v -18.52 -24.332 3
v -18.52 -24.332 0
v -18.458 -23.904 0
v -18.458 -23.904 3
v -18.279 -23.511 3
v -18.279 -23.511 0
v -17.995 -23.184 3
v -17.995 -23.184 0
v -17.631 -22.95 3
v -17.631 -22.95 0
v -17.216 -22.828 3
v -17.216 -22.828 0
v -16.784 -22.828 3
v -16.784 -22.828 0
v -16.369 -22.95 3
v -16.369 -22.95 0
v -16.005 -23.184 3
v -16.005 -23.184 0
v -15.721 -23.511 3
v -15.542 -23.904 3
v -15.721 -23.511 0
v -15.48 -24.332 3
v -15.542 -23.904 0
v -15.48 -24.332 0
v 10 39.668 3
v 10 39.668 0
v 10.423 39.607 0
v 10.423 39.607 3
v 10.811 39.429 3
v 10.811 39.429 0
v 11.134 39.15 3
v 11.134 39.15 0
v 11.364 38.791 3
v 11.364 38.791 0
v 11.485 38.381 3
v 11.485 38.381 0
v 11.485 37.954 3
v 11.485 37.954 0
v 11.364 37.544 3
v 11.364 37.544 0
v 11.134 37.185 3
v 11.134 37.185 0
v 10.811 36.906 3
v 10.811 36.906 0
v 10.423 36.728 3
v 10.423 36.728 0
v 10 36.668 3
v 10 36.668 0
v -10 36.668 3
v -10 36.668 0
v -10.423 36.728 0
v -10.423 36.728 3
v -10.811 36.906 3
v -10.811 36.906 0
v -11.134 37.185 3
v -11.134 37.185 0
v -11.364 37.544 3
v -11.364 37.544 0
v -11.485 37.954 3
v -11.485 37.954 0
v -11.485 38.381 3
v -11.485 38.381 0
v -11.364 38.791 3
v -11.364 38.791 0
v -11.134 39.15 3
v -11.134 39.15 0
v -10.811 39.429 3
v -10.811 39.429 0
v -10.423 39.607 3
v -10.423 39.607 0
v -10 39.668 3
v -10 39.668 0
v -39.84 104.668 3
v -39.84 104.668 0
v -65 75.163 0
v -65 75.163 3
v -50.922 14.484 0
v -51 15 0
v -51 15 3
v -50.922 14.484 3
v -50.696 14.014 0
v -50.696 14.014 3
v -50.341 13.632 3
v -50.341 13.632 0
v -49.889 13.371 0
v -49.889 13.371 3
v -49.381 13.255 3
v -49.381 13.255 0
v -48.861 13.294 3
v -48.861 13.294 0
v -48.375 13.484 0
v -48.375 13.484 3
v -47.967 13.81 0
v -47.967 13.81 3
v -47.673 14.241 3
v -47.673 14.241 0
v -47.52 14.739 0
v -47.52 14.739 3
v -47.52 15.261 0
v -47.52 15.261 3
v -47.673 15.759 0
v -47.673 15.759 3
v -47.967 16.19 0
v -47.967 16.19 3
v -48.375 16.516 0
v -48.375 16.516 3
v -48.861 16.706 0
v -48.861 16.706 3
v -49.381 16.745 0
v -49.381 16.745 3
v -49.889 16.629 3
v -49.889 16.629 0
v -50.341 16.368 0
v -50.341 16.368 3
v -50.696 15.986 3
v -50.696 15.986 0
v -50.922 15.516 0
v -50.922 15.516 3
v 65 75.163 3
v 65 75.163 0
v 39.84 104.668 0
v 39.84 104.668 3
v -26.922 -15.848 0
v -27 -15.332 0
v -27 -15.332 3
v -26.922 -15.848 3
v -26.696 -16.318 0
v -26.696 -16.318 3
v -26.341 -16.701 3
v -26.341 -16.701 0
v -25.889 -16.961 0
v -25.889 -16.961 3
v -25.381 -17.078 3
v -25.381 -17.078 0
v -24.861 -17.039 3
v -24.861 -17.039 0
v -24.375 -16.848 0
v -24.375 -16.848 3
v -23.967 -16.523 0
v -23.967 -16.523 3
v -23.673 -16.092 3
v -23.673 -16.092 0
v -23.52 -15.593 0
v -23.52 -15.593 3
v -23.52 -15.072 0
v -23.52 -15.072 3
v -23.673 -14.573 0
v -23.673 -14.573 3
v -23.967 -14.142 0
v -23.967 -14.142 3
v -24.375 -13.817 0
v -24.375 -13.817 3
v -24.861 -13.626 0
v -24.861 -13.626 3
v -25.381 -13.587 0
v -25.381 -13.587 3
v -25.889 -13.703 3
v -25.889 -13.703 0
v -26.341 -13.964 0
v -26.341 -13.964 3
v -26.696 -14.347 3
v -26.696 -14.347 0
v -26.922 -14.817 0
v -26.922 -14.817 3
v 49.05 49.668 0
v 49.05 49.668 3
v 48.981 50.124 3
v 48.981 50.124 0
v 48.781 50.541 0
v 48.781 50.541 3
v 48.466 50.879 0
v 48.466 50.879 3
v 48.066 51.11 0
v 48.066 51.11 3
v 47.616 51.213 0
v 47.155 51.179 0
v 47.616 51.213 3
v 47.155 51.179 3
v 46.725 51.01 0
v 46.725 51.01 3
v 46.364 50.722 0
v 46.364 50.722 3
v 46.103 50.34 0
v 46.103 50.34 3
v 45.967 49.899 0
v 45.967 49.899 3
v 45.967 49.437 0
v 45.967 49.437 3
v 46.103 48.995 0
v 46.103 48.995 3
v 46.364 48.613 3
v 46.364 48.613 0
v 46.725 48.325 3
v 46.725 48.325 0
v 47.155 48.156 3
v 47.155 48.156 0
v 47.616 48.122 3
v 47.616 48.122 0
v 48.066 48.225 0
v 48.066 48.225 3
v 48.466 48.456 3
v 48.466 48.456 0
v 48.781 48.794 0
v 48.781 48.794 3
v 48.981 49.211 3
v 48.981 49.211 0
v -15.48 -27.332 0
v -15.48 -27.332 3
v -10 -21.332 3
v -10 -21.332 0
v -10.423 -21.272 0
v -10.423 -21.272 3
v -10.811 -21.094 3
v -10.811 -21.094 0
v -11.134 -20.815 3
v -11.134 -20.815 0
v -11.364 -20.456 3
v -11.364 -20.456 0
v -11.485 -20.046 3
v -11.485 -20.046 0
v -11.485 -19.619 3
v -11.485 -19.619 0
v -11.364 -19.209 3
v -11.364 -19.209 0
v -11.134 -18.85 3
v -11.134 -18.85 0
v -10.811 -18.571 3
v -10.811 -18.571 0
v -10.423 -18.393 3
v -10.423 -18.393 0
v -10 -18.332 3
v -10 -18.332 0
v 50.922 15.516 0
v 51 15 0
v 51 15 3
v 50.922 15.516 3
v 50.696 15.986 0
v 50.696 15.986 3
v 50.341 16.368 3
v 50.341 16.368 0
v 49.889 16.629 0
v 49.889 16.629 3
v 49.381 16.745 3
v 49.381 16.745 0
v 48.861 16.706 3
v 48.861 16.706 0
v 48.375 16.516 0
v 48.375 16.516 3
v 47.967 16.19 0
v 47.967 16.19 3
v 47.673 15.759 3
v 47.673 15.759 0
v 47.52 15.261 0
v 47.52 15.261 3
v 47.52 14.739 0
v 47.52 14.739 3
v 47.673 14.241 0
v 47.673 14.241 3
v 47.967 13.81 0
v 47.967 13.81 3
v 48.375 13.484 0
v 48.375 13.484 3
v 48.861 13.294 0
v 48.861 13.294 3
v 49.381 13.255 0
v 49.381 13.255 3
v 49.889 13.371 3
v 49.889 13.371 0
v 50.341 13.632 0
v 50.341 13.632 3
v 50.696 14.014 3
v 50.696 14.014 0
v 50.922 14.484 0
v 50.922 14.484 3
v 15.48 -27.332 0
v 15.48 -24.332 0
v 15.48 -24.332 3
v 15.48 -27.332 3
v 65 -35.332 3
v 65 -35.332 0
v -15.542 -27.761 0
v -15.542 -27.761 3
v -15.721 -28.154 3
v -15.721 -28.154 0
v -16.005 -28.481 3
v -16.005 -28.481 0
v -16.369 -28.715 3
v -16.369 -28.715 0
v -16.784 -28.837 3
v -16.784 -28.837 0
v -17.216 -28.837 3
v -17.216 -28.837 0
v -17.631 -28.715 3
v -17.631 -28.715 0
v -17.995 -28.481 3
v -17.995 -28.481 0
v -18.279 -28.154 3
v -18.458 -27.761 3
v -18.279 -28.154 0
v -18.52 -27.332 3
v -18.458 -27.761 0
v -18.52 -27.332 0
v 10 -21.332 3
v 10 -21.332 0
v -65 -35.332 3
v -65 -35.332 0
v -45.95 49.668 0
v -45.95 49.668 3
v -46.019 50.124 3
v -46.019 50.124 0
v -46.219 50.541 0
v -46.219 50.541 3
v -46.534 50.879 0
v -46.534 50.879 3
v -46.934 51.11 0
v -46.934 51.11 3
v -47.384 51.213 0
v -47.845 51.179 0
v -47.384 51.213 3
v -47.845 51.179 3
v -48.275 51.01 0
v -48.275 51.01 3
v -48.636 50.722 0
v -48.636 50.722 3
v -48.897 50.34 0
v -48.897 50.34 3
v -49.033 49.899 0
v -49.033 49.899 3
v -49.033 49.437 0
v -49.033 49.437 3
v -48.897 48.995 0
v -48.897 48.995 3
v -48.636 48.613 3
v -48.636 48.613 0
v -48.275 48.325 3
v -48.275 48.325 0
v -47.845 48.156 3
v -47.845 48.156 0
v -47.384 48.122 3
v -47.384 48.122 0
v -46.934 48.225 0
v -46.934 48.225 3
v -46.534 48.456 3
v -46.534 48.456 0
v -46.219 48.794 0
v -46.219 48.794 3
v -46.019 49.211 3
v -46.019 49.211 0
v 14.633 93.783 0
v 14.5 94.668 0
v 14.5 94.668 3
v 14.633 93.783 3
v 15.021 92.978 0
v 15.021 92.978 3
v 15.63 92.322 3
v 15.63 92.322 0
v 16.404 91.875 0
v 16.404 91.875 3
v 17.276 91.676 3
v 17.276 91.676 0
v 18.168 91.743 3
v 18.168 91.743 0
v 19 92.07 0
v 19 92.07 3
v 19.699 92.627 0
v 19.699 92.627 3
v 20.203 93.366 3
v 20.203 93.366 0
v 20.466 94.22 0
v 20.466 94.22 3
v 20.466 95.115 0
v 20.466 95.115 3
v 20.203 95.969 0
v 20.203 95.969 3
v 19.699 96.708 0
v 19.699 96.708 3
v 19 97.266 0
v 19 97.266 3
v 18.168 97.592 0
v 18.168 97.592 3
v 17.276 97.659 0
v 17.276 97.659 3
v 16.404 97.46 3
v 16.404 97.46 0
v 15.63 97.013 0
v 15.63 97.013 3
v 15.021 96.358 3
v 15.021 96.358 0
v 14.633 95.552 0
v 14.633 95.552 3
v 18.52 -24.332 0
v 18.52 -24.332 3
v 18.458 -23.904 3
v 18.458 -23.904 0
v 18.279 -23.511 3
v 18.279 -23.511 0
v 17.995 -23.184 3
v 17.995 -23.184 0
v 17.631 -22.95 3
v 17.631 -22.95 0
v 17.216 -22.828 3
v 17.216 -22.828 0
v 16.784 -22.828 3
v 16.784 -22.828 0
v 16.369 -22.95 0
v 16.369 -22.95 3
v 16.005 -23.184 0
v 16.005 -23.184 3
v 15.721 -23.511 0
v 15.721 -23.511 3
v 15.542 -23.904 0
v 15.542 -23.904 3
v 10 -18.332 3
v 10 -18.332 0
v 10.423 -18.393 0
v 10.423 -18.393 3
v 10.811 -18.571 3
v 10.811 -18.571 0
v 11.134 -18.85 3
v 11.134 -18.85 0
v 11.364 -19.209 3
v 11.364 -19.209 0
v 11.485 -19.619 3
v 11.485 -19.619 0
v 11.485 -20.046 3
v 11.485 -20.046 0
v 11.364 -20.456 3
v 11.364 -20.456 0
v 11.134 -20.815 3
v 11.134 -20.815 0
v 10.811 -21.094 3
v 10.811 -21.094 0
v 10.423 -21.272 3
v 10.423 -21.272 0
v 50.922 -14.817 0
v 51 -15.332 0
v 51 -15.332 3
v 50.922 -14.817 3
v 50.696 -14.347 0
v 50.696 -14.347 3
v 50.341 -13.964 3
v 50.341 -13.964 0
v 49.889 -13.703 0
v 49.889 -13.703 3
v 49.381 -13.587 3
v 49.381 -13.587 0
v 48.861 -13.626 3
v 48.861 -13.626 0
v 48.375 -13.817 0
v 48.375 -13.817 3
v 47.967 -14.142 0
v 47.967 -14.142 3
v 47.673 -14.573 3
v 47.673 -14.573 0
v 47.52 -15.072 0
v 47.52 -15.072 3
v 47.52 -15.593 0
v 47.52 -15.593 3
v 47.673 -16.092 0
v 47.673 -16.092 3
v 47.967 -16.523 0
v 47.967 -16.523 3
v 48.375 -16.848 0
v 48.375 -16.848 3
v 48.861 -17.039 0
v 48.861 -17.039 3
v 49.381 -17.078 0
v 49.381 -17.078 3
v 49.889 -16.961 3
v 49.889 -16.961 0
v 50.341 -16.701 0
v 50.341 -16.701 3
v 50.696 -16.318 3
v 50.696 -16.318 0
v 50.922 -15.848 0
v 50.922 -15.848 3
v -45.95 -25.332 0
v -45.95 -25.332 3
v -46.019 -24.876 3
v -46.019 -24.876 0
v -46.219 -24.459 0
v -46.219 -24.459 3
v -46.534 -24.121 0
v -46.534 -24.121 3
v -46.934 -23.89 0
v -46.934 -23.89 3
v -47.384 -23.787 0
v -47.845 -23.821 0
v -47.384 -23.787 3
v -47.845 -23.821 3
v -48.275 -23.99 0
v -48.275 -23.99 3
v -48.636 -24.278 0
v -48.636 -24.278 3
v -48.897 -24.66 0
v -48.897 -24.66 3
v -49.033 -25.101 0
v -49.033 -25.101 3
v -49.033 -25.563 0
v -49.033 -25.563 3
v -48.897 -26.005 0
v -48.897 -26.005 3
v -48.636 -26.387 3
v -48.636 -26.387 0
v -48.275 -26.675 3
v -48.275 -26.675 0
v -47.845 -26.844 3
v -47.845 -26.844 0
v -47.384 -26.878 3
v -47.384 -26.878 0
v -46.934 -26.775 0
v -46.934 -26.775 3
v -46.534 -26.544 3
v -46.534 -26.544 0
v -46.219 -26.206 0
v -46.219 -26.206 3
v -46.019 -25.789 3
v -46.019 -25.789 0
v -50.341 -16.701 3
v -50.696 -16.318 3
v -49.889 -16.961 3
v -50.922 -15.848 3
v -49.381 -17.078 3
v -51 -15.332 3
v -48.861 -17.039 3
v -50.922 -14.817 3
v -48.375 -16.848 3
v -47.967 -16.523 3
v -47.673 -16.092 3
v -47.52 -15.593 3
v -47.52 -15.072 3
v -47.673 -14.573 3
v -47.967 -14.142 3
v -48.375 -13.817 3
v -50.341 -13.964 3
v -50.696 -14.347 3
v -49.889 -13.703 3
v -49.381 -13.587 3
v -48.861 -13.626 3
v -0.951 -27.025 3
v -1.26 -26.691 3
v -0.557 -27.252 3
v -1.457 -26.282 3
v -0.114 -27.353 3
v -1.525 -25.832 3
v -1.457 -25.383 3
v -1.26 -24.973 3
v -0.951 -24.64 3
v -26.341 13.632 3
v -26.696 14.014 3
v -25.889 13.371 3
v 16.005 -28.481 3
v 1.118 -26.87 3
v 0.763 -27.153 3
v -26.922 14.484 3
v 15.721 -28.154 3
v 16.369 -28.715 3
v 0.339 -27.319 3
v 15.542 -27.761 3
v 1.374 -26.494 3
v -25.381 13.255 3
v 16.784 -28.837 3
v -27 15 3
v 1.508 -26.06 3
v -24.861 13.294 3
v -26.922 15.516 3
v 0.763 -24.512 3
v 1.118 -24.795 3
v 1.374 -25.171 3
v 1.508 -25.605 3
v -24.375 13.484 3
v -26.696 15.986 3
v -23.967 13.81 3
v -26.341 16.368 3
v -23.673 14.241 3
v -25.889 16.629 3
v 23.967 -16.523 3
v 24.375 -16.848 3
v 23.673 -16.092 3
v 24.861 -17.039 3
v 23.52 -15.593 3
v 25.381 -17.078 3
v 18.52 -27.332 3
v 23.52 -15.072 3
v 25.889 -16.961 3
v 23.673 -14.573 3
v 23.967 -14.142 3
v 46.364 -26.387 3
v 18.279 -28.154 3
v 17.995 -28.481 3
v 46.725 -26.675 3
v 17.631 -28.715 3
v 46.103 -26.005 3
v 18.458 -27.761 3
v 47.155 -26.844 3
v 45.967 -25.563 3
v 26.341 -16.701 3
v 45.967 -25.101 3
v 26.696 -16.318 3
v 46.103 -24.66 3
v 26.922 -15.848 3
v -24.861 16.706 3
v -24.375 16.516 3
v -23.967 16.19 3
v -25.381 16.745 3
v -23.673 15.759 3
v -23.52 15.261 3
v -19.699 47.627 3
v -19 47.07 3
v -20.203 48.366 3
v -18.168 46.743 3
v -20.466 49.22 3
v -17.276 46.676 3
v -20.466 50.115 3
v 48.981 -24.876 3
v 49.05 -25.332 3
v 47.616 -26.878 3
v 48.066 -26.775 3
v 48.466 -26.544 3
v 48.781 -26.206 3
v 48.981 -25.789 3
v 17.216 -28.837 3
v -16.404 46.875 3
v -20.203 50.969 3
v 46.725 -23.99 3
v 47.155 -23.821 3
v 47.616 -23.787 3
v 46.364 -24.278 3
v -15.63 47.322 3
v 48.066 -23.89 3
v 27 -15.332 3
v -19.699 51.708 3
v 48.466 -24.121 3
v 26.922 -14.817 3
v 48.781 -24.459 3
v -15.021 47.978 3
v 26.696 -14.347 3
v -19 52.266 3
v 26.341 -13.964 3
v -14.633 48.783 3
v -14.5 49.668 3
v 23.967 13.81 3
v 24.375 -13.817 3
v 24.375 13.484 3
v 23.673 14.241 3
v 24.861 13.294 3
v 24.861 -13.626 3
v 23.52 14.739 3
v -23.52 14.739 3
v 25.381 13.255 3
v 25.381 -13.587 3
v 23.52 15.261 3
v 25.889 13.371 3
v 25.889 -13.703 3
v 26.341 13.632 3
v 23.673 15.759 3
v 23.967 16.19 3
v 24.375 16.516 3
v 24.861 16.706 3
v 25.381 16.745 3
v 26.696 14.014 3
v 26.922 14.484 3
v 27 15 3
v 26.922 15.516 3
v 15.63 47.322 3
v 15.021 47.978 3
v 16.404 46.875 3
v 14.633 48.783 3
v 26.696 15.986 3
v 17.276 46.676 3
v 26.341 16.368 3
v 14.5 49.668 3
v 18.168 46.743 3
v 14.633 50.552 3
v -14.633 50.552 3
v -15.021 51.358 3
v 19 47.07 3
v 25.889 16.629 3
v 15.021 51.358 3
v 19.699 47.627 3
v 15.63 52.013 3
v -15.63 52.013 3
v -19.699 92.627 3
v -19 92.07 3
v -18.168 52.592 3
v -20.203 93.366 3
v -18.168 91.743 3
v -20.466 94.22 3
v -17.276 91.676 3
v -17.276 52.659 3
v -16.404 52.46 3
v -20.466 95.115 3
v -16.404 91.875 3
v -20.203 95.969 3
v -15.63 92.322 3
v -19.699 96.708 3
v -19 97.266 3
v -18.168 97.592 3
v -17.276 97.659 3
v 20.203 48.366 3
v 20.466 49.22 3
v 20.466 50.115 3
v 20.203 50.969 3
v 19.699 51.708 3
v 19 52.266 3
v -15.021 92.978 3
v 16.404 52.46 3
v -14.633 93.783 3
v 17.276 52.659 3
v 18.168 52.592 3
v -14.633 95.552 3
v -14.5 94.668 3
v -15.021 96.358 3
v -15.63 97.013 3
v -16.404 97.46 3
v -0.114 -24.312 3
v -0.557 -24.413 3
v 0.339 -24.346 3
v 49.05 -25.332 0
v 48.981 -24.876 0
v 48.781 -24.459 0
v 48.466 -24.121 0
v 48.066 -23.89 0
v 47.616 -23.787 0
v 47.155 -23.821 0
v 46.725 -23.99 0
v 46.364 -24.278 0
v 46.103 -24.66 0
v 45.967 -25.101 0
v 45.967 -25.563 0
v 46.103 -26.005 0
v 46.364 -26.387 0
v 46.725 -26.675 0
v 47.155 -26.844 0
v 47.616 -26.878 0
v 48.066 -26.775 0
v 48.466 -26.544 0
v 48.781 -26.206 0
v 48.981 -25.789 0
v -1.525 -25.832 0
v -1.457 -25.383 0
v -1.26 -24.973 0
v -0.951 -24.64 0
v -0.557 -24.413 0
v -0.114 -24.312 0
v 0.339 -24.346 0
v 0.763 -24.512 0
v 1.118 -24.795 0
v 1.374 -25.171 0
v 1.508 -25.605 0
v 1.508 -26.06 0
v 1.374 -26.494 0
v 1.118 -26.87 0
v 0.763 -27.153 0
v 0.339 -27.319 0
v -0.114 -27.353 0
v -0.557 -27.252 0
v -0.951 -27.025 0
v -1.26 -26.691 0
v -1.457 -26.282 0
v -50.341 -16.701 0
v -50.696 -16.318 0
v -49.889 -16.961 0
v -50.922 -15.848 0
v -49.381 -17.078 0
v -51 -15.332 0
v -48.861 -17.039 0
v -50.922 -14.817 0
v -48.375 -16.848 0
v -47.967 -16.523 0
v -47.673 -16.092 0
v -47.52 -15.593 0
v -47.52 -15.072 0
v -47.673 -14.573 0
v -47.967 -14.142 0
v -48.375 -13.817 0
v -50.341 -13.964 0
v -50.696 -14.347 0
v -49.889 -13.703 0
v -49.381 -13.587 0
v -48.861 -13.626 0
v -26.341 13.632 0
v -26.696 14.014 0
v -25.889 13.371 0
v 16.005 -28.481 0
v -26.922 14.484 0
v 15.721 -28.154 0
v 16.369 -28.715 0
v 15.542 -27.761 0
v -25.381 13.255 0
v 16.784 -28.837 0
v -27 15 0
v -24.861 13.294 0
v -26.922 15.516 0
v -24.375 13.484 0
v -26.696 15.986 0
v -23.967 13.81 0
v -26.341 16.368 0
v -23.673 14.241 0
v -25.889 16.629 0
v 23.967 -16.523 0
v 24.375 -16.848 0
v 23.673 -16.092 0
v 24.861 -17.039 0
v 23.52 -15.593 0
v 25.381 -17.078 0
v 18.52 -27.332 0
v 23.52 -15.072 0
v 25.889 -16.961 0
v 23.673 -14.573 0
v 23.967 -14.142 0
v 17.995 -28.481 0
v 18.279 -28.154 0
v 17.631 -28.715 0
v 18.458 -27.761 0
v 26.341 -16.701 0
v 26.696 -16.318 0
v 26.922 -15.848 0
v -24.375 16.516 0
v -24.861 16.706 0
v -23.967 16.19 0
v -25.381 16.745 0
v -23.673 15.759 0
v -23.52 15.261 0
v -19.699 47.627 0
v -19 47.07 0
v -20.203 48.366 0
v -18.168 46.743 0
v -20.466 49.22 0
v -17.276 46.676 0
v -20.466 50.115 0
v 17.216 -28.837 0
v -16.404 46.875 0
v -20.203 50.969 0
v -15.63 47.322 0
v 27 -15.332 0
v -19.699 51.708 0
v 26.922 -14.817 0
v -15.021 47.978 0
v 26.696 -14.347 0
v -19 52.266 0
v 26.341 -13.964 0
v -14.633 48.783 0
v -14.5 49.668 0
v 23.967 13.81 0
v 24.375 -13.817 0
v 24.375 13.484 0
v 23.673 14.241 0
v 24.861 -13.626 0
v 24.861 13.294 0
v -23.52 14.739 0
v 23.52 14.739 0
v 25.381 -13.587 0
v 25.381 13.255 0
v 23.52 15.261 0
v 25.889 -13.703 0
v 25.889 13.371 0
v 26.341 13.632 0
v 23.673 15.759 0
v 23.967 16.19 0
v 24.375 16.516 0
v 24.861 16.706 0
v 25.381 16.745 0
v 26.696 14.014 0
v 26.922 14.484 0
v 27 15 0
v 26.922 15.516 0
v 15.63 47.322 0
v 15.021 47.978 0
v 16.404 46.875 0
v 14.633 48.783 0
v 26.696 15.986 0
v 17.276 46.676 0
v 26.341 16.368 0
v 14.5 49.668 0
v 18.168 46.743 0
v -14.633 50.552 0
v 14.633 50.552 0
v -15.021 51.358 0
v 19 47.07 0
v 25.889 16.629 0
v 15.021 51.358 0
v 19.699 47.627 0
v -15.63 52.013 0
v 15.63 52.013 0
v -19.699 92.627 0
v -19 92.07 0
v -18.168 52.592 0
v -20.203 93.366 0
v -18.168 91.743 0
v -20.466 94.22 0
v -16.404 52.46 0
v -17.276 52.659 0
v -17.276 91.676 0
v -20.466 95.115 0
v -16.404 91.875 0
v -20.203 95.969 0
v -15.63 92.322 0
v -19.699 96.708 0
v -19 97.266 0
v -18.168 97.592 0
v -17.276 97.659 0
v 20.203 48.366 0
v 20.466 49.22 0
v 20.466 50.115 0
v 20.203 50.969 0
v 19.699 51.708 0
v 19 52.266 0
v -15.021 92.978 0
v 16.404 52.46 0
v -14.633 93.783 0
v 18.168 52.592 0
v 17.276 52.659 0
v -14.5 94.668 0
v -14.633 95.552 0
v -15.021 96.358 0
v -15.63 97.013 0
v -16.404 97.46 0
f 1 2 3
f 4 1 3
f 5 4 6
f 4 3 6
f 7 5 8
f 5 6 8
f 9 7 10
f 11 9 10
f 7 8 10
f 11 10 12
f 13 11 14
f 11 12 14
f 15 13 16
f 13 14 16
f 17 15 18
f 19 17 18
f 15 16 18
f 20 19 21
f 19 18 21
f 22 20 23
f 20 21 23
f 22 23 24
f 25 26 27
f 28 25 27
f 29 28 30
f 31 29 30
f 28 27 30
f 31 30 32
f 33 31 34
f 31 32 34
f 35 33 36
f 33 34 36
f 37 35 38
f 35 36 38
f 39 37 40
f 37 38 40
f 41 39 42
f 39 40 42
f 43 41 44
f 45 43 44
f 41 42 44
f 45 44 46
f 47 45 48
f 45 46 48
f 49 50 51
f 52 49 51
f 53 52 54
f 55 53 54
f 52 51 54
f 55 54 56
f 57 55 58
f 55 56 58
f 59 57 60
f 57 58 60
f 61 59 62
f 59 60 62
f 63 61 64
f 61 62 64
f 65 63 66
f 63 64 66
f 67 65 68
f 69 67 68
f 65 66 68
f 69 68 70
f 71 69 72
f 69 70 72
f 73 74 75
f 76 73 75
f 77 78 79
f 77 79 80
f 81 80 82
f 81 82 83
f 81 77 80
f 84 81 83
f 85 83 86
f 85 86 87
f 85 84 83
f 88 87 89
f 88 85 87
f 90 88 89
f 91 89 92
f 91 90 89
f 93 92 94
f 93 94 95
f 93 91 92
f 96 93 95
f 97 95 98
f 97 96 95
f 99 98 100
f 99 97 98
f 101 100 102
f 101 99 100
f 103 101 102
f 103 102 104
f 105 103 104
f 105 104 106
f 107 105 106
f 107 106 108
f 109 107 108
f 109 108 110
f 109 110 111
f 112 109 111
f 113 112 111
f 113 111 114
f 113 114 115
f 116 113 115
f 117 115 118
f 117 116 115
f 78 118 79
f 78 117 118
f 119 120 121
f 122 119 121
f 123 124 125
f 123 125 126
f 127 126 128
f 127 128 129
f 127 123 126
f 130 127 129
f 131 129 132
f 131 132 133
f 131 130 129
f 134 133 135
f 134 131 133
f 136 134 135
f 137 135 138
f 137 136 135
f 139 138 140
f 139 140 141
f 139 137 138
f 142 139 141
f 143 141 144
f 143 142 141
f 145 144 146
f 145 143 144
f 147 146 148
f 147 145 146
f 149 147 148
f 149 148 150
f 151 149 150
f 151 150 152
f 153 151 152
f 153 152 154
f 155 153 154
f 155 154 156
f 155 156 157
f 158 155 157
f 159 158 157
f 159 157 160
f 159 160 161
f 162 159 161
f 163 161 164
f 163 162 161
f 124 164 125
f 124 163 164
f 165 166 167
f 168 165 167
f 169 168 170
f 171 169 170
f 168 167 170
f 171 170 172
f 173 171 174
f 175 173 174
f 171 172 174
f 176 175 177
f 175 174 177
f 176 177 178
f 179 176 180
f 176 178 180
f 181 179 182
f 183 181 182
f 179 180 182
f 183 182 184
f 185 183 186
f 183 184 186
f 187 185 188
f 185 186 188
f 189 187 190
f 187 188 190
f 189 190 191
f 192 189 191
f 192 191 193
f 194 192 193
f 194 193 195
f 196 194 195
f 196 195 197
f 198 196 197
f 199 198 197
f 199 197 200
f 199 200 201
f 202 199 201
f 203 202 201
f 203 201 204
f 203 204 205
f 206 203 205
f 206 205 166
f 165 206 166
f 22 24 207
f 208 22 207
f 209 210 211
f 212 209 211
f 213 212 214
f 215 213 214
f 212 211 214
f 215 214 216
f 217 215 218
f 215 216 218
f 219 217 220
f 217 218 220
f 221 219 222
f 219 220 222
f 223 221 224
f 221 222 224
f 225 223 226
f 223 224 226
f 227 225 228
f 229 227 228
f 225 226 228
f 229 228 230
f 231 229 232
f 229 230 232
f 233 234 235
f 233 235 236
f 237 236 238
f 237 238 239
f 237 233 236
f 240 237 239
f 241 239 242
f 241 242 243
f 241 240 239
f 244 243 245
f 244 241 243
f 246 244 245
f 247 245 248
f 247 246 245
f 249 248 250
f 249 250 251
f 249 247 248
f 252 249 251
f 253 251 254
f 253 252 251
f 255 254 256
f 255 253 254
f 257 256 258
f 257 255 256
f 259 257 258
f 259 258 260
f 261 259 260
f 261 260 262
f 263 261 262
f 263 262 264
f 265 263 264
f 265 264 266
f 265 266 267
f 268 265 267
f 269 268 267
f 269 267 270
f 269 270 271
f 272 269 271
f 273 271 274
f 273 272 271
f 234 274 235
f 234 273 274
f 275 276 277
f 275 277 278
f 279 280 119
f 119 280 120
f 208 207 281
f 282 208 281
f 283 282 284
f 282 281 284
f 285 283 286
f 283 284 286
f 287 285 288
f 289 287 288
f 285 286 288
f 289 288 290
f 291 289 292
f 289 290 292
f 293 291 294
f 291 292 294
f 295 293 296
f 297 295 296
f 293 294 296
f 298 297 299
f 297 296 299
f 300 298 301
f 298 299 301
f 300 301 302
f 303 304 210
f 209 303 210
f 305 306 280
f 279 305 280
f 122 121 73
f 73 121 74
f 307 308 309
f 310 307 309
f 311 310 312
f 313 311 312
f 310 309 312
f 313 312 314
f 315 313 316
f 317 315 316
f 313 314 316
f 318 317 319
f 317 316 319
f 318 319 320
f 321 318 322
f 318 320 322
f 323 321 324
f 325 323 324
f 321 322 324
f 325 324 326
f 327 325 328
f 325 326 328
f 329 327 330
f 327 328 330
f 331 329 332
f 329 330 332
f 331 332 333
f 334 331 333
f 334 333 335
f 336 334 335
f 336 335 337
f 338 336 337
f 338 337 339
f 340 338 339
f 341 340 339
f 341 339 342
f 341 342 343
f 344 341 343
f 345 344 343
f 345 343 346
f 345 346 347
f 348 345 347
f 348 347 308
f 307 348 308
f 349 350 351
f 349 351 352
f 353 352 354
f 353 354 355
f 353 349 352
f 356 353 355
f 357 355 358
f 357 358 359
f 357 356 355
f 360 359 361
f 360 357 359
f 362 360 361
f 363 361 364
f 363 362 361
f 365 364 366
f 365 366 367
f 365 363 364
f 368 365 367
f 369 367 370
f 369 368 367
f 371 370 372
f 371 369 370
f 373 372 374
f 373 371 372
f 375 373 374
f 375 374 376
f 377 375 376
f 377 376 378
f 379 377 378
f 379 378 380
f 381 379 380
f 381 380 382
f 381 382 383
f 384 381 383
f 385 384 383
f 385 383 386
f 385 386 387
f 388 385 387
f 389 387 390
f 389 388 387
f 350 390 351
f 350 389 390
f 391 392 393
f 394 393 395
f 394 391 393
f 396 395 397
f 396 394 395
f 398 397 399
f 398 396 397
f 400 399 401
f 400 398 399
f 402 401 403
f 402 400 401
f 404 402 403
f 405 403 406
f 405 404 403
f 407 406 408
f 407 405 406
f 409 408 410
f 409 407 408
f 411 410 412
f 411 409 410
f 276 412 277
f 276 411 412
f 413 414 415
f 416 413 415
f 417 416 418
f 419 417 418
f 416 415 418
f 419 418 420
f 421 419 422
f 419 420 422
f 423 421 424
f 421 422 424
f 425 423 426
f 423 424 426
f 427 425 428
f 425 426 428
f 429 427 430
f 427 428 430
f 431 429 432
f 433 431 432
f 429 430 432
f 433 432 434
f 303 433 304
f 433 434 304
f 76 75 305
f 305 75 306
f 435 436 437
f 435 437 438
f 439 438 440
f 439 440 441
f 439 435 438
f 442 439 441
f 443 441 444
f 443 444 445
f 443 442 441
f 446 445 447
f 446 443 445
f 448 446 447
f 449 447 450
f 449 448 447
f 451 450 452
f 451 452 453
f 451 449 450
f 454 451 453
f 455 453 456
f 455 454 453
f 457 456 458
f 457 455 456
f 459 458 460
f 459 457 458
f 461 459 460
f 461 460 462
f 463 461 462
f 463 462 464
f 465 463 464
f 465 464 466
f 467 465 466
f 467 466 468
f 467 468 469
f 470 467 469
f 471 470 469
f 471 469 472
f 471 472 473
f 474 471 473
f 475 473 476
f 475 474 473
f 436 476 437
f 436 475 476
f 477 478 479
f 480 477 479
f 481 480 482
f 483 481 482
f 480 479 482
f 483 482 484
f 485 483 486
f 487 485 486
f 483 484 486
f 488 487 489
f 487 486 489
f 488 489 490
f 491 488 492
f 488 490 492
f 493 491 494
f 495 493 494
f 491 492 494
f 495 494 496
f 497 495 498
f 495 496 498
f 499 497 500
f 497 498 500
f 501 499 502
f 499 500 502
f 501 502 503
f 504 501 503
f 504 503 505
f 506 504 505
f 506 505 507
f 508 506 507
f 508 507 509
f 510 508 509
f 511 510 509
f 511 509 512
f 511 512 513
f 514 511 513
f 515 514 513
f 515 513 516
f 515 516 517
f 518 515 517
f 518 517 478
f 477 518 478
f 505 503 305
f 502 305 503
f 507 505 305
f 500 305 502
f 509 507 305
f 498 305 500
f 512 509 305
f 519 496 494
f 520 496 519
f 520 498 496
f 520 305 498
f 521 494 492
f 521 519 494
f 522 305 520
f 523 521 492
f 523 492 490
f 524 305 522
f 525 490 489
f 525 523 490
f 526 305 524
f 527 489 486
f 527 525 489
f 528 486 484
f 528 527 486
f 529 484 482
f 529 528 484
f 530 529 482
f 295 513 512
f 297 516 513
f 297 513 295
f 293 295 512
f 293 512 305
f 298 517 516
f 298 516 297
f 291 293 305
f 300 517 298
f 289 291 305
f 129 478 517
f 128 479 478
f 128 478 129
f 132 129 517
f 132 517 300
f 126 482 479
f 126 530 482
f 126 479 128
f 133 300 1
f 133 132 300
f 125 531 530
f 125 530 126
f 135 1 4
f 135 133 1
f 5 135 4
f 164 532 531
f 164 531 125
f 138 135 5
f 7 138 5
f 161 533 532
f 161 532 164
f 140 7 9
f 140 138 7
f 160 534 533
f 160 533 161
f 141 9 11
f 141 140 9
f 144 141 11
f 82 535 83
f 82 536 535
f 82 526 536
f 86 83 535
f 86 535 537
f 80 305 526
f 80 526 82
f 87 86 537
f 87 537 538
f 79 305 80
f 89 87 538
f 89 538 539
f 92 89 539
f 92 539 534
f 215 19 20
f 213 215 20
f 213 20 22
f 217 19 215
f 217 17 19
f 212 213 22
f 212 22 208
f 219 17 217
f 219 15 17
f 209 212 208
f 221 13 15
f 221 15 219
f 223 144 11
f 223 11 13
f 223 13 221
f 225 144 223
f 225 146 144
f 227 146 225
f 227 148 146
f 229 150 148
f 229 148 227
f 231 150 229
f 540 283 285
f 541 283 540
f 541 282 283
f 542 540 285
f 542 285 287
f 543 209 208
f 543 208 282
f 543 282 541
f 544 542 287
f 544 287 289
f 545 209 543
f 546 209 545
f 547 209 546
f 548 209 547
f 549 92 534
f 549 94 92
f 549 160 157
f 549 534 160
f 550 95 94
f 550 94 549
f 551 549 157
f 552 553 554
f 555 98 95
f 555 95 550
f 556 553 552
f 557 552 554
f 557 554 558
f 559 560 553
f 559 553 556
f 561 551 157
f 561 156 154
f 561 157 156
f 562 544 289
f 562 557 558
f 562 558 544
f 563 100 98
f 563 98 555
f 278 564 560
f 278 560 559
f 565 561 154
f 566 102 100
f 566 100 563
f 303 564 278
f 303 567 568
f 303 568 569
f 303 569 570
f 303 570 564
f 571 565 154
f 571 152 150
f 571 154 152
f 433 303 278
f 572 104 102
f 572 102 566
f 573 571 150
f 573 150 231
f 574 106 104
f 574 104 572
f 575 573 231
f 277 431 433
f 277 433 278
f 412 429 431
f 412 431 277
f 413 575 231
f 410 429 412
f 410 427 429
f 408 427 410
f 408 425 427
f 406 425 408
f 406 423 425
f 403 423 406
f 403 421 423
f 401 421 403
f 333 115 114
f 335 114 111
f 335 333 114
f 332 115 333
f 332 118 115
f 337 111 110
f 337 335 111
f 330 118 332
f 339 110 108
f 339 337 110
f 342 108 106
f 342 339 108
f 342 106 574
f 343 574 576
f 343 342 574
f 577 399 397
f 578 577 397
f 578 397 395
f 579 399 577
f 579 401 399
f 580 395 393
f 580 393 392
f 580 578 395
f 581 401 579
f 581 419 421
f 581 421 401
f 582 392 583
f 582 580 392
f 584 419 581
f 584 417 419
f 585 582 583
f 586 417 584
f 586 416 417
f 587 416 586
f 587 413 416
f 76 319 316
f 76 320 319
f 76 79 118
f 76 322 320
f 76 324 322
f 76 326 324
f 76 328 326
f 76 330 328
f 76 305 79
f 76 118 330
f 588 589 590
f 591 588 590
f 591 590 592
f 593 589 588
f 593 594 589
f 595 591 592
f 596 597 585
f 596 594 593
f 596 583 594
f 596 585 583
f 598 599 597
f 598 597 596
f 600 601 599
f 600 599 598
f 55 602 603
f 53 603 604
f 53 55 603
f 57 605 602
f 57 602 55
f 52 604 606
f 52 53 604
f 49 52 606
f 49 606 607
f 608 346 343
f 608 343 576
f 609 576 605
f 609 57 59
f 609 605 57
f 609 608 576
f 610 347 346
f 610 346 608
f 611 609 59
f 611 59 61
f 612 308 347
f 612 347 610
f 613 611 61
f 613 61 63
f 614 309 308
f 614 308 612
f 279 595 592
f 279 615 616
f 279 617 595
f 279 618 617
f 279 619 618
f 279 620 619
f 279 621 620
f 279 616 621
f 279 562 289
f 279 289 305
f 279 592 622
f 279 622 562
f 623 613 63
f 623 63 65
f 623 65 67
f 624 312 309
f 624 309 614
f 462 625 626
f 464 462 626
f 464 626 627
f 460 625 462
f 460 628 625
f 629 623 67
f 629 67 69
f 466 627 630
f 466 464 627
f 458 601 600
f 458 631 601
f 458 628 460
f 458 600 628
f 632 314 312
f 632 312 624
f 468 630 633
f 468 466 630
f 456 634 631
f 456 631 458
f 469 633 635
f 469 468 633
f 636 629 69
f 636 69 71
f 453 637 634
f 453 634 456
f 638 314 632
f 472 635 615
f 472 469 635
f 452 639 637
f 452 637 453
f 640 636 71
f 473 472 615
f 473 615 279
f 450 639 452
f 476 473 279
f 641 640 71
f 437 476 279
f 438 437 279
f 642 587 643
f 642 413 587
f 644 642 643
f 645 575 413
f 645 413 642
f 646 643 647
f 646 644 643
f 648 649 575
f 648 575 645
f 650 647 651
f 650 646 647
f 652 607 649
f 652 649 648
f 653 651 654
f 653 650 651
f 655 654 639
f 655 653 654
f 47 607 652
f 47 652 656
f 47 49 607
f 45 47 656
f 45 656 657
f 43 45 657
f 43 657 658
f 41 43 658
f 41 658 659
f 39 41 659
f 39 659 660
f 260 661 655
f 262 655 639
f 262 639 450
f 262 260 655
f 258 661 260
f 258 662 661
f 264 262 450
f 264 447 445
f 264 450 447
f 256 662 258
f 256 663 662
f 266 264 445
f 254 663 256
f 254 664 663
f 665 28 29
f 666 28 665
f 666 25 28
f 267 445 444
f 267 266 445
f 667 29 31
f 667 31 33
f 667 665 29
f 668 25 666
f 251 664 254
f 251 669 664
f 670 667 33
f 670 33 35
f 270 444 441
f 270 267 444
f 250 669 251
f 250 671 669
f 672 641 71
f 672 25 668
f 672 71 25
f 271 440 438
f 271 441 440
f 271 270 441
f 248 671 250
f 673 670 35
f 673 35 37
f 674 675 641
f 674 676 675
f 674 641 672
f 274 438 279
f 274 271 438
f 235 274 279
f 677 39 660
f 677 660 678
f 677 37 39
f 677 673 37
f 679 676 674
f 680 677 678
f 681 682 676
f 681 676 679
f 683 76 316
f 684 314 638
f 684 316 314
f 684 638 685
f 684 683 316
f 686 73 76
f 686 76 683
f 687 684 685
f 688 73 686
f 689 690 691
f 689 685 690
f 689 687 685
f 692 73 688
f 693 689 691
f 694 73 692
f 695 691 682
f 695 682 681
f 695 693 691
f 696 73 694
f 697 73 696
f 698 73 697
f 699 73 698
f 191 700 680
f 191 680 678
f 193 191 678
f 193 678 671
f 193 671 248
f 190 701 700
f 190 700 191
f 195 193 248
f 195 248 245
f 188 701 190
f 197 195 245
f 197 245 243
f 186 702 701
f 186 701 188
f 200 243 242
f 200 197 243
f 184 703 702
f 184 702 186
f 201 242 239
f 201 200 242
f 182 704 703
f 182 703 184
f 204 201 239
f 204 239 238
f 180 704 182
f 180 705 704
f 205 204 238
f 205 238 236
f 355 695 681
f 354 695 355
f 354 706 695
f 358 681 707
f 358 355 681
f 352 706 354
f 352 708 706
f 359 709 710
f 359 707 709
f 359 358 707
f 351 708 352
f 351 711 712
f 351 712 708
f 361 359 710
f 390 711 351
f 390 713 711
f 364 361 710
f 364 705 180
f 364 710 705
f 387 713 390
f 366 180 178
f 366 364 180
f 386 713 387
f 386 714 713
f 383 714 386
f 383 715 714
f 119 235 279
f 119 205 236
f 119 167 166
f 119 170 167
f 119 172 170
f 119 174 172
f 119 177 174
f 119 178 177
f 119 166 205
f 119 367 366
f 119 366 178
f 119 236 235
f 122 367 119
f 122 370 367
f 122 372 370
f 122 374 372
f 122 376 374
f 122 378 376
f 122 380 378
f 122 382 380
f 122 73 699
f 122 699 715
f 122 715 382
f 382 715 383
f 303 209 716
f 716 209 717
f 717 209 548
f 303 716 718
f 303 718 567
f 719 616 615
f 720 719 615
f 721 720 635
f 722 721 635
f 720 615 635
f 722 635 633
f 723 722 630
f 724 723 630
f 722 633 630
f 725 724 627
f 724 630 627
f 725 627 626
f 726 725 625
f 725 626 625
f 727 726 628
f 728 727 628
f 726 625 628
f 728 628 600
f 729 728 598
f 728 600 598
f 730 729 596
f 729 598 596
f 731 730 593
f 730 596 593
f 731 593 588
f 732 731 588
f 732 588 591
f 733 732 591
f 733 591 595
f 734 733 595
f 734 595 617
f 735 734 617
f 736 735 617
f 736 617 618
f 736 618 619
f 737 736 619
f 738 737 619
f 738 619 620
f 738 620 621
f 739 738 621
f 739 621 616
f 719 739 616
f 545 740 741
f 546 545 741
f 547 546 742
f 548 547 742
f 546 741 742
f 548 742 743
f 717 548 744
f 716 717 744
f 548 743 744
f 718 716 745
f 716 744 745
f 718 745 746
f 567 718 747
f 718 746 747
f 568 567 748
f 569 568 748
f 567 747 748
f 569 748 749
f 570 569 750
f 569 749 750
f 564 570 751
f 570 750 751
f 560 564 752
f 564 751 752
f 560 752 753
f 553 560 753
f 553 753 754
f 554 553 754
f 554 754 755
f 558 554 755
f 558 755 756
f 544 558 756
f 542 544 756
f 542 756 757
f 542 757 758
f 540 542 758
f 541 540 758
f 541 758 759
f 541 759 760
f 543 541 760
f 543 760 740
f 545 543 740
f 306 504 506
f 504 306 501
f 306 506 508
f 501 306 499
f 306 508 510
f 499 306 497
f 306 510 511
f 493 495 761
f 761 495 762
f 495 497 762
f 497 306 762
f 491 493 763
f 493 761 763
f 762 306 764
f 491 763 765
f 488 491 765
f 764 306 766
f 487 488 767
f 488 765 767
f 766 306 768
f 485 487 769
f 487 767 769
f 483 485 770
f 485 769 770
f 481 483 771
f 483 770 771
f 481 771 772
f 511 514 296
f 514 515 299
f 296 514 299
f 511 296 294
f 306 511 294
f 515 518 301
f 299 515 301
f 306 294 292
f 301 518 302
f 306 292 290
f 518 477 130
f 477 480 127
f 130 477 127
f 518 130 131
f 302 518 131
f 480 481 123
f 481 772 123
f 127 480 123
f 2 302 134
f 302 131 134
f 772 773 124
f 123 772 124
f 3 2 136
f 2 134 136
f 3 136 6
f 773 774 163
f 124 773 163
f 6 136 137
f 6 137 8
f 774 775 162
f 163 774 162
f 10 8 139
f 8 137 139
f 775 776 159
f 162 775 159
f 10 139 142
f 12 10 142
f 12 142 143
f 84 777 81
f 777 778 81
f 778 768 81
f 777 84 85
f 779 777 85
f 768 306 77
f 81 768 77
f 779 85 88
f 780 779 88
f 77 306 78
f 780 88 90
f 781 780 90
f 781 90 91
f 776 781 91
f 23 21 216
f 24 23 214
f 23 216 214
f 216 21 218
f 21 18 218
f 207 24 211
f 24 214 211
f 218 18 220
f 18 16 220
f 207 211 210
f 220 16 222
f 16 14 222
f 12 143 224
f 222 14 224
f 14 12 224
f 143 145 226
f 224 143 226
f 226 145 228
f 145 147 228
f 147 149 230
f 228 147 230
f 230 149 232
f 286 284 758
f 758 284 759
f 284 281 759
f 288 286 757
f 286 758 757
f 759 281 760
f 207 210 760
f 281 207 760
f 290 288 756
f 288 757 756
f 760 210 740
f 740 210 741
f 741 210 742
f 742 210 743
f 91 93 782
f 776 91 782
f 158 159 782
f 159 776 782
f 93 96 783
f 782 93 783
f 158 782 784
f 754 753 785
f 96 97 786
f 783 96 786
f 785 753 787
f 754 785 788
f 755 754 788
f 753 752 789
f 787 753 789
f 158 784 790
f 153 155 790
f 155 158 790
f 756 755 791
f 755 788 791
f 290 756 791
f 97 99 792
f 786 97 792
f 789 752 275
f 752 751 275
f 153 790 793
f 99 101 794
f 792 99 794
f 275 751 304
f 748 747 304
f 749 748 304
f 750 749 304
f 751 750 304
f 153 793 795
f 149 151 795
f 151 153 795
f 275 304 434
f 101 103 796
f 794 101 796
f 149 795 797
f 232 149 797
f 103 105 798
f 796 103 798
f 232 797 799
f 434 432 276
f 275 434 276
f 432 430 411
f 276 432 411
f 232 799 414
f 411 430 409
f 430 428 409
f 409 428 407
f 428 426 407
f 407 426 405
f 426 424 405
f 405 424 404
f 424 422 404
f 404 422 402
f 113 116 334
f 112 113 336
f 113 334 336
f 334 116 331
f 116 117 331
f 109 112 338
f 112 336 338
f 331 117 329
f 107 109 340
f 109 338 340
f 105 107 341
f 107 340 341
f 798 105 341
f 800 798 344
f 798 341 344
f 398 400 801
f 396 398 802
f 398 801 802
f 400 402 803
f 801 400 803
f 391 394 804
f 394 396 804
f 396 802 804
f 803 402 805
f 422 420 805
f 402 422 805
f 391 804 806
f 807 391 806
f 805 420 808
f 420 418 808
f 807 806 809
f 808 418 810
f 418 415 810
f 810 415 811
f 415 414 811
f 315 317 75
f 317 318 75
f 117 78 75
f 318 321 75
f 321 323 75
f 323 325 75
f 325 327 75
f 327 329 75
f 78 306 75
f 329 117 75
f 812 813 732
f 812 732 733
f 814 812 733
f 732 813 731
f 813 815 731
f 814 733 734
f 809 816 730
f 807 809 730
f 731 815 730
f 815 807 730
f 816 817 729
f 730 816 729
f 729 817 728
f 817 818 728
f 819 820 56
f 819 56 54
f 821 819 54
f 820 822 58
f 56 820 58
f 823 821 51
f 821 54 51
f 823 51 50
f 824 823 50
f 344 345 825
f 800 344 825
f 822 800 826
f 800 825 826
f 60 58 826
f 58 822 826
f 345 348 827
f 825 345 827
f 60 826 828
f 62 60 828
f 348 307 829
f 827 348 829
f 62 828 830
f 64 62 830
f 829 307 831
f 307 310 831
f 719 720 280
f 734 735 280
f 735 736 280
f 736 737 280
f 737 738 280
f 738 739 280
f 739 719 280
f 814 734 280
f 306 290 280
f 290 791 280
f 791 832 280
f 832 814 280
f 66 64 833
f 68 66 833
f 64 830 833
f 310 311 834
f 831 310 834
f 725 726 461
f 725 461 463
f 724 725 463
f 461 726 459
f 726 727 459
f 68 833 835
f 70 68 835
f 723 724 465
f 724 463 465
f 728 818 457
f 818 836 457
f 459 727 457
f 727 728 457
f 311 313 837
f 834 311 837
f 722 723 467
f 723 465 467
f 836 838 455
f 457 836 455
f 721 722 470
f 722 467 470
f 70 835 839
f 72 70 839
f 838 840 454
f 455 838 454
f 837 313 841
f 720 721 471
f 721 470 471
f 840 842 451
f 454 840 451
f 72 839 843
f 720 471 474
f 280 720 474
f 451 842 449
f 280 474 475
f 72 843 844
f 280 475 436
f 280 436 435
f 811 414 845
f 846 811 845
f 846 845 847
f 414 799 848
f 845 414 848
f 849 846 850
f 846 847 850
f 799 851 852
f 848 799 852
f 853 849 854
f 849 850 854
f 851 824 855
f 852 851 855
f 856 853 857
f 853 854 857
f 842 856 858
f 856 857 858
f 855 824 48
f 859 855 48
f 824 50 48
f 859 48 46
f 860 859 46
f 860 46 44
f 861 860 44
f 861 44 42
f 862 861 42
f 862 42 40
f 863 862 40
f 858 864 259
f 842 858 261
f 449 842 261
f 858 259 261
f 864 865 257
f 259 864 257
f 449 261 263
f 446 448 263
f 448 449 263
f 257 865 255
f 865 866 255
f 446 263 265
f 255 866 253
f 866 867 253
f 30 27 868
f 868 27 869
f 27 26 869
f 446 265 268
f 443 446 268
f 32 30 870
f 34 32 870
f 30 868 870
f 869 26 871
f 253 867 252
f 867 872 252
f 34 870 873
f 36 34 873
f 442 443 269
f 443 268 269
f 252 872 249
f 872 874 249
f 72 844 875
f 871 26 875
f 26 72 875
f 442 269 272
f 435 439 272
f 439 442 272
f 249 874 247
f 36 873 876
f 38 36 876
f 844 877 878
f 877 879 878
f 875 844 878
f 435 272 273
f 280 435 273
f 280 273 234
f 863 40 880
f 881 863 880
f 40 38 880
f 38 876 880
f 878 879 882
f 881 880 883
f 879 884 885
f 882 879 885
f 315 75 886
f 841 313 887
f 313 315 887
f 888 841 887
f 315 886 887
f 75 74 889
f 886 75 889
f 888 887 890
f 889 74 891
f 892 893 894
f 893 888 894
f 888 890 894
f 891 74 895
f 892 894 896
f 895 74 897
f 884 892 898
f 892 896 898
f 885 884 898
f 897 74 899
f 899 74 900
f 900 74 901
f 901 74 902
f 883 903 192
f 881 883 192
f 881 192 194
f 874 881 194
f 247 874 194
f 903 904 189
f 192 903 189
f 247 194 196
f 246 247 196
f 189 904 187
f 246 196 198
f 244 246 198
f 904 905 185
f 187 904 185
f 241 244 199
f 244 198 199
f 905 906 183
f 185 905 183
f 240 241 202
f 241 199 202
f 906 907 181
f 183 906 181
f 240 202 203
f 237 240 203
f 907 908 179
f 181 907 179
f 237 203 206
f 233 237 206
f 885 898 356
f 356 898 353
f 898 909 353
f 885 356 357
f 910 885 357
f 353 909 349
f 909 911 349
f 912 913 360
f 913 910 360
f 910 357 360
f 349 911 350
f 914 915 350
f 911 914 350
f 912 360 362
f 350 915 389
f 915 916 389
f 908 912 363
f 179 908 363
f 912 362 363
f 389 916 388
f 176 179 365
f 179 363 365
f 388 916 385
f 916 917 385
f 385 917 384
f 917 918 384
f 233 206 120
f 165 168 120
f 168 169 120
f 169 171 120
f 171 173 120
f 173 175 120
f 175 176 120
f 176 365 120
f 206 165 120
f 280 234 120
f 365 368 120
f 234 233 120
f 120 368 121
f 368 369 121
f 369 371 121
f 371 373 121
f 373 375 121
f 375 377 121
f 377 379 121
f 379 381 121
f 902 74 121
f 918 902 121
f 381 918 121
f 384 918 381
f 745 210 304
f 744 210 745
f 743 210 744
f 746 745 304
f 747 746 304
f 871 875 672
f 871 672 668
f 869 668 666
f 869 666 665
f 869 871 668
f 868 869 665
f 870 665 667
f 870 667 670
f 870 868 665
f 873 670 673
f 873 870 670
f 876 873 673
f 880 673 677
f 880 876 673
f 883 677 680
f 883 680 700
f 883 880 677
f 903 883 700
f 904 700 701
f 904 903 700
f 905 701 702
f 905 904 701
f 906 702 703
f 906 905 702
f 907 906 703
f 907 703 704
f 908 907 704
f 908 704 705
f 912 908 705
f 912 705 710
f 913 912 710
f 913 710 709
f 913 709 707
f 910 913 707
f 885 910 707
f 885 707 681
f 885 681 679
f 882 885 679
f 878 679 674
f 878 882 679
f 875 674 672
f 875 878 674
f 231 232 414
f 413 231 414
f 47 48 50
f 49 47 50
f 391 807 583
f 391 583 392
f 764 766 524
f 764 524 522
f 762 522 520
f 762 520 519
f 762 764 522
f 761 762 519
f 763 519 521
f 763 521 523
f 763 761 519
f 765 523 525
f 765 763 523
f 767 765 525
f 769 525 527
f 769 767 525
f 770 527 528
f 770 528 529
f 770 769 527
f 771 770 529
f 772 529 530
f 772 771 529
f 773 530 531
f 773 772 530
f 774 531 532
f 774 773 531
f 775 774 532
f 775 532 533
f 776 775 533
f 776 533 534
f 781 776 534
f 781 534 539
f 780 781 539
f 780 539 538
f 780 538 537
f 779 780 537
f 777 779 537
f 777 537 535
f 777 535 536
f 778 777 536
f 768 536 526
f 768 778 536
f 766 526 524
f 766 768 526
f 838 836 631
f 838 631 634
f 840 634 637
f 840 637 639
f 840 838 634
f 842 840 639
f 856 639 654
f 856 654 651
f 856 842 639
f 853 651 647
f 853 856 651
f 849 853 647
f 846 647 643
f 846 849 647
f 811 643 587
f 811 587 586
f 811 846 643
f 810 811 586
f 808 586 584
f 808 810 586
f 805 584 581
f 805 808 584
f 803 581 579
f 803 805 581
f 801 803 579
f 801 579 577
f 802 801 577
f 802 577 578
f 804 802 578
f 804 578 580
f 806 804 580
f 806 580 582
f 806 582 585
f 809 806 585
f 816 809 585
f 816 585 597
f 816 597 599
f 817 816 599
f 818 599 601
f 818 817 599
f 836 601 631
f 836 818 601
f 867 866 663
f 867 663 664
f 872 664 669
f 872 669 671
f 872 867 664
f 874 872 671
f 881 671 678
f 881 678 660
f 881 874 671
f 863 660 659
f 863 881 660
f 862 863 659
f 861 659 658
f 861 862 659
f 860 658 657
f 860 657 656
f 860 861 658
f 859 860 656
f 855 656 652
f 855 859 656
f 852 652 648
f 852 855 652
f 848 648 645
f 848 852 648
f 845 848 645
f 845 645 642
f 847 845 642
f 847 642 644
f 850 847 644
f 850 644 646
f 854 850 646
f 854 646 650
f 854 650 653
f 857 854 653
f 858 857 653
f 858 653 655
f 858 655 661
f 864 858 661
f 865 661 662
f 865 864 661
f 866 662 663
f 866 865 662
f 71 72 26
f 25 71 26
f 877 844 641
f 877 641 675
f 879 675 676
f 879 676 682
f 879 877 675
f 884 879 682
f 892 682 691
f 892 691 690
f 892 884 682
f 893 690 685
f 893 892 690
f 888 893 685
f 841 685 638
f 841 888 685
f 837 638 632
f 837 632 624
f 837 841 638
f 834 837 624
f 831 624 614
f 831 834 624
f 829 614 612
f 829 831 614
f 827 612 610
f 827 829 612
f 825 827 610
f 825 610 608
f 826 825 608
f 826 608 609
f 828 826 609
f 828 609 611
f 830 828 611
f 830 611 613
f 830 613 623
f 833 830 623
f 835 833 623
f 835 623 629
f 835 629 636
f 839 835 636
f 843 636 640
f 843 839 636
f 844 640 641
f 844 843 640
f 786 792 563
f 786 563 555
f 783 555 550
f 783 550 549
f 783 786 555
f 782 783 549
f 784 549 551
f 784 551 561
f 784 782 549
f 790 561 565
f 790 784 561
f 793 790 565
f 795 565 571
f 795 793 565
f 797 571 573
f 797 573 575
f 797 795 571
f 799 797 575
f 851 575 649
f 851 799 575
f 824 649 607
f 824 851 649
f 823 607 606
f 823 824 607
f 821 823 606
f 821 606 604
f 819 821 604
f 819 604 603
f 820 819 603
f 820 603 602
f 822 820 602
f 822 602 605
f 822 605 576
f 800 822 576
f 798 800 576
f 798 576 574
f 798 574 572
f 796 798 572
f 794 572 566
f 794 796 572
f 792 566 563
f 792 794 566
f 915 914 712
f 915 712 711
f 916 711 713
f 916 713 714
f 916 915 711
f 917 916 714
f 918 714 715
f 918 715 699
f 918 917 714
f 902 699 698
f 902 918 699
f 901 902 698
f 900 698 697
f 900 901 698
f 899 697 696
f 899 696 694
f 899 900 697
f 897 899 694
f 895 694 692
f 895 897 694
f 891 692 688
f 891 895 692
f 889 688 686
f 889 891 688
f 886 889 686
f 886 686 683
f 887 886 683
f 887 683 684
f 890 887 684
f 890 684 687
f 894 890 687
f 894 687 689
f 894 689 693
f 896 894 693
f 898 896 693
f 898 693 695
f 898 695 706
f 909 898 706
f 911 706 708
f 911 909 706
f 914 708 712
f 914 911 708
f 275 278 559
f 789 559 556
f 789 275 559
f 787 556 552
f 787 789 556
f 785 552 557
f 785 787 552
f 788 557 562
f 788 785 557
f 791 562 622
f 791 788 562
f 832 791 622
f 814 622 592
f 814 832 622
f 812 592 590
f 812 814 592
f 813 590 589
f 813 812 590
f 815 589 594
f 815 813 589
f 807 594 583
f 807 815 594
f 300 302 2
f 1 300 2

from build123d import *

# Parameters (mm, degrees)
SKETCH_1_R          = 1.75
SKETCH_1_R_2        = 3
EXTRUDE_1_DEPTH     = 3
SKETCH_3_R          = 1.525
CUT_EXTRUDE_2_DEPTH = 10
SKETCH_5_R          = 1.55
CUT_EXTRUDE_3_DEPTH = 10


with BuildPart() as part:
    # 草图1 → 凸台-拉伸1 (new body)
    with BuildSketch(Plane.XY):
        Polygon((65, -25), (65, 75.163369284), (39.840227583, 104.667600302), (-39.840227583, 104.667600302), (-65, 75.163369284), (-65, -25), (-65, -35.332399698), (65, -35.332399698), align=None)
        with Locations((49.25, -15.332399698)):
            Circle(SKETCH_1_R, mode=Mode.SUBTRACT)
        with Locations((25.25, -15.332399698)):
            Circle(SKETCH_1_R, mode=Mode.SUBTRACT)
        with Locations((25.25, 15)):
            Circle(SKETCH_1_R, mode=Mode.SUBTRACT)
        with Locations((49.25, 15)):
            Circle(SKETCH_1_R, mode=Mode.SUBTRACT)
        with Locations(Location((-49.25, 15, 0), (0, 0, 180))):
            Circle(SKETCH_1_R, mode=Mode.SUBTRACT)
        with Locations(Location((-25.25, 15, 0), (0, 0, 180))):
            Circle(SKETCH_1_R, mode=Mode.SUBTRACT)
        with Locations(Location((-25.25, -15.332399698, 0), (0, 0, 180))):
            Circle(SKETCH_1_R, mode=Mode.SUBTRACT)
        with Locations(Location((-49.25, -15.332399698, 0), (0, 0, 180))):
            Circle(SKETCH_1_R, mode=Mode.SUBTRACT)
        with Locations((-17.5, 94.667600302)):
            Circle(SKETCH_1_R_2, mode=Mode.SUBTRACT)
        with Locations(Location((17.5, 94.667600302, 0), (0, 0, 180))):
            Circle(SKETCH_1_R_2, mode=Mode.SUBTRACT)
        with Locations((-17.5, 49.667600302)):
            Circle(SKETCH_1_R_2, mode=Mode.SUBTRACT)
        with Locations(Location((17.5, 49.667600302, 0), (0, 0, 180))):
            Circle(SKETCH_1_R_2, mode=Mode.SUBTRACT)
        with BuildLine():
            Line((-10, 39.667600302), (10, 39.667600302))
            ThreePointArc((10, 39.667600302), (11.5, 38.167600302), (10, 36.667600302))
            Line((10, 36.667600302), (-10, 36.667600302))
            ThreePointArc((-10, 36.667600302), (-11.5, 38.167600302), (-10, 39.667600302))
        make_face(mode=Mode.SUBTRACT)
        with BuildLine():
            Line((-10, -18.332399698), (10, -18.332399698))
            ThreePointArc((10, -18.332399698), (11.5, -19.832399698), (10, -21.332399698))
            Line((10, -21.332399698), (-10, -21.332399698))
            ThreePointArc((-10, -21.332399698), (-11.5, -19.832399698), (-10, -18.332399698))
        make_face(mode=Mode.SUBTRACT)
    extrude(amount=EXTRUDE_1_DEPTH)

    # 草图3 → 切除-拉伸2 (cut)
    with BuildSketch(Plane(origin=(0, 0, 0), x_dir=(-1, 0, 0), z_dir=(0, 0, -1))):
        with Locations((0, -25.832399698)):
            Circle(SKETCH_3_R)
        with BuildLine():
            Line((-18.52, -27.332399698), (-18.52, -24.332399698))
            ThreePointArc((-18.52, -24.332399698), (-17, -22.812399698), (-15.48, -24.332399698))
            Line((-15.48, -24.332399698), (-15.48, -27.332399698))
            ThreePointArc((-15.48, -27.332399698), (-17, -28.852399698), (-18.52, -27.332399698))
        make_face()
        with BuildLine():
            Line((18.52, -27.332399698), (18.52, -24.332399698))
            ThreePointArc((18.52, -24.332399698), (17, -22.812399698), (15.48, -24.332399698))
            Line((15.48, -24.332399698), (15.48, -27.332399698))
            ThreePointArc((15.48, -27.332399698), (17, -28.852399698), (18.52, -27.332399698))
        make_face()
    extrude(amount=-CUT_EXTRUDE_2_DEPTH, mode=Mode.SUBTRACT)

    # 草图5 → 切除-拉伸3 (cut)
    with BuildSketch(Plane.XY.offset(3)):
        with Locations((-47.5, 49.667600302)):
            Circle(SKETCH_5_R)
        with Locations((47.5, 49.667600302)):
            Circle(SKETCH_5_R)
        with Locations((-47.5, -25.332399698)):
            Circle(SKETCH_5_R)
        with Locations((47.5, -25.332399698)):
            Circle(SKETCH_5_R)
    extrude(amount=-CUT_EXTRUDE_3_DEPTH, mode=Mode.SUBTRACT)


solid = part.part
